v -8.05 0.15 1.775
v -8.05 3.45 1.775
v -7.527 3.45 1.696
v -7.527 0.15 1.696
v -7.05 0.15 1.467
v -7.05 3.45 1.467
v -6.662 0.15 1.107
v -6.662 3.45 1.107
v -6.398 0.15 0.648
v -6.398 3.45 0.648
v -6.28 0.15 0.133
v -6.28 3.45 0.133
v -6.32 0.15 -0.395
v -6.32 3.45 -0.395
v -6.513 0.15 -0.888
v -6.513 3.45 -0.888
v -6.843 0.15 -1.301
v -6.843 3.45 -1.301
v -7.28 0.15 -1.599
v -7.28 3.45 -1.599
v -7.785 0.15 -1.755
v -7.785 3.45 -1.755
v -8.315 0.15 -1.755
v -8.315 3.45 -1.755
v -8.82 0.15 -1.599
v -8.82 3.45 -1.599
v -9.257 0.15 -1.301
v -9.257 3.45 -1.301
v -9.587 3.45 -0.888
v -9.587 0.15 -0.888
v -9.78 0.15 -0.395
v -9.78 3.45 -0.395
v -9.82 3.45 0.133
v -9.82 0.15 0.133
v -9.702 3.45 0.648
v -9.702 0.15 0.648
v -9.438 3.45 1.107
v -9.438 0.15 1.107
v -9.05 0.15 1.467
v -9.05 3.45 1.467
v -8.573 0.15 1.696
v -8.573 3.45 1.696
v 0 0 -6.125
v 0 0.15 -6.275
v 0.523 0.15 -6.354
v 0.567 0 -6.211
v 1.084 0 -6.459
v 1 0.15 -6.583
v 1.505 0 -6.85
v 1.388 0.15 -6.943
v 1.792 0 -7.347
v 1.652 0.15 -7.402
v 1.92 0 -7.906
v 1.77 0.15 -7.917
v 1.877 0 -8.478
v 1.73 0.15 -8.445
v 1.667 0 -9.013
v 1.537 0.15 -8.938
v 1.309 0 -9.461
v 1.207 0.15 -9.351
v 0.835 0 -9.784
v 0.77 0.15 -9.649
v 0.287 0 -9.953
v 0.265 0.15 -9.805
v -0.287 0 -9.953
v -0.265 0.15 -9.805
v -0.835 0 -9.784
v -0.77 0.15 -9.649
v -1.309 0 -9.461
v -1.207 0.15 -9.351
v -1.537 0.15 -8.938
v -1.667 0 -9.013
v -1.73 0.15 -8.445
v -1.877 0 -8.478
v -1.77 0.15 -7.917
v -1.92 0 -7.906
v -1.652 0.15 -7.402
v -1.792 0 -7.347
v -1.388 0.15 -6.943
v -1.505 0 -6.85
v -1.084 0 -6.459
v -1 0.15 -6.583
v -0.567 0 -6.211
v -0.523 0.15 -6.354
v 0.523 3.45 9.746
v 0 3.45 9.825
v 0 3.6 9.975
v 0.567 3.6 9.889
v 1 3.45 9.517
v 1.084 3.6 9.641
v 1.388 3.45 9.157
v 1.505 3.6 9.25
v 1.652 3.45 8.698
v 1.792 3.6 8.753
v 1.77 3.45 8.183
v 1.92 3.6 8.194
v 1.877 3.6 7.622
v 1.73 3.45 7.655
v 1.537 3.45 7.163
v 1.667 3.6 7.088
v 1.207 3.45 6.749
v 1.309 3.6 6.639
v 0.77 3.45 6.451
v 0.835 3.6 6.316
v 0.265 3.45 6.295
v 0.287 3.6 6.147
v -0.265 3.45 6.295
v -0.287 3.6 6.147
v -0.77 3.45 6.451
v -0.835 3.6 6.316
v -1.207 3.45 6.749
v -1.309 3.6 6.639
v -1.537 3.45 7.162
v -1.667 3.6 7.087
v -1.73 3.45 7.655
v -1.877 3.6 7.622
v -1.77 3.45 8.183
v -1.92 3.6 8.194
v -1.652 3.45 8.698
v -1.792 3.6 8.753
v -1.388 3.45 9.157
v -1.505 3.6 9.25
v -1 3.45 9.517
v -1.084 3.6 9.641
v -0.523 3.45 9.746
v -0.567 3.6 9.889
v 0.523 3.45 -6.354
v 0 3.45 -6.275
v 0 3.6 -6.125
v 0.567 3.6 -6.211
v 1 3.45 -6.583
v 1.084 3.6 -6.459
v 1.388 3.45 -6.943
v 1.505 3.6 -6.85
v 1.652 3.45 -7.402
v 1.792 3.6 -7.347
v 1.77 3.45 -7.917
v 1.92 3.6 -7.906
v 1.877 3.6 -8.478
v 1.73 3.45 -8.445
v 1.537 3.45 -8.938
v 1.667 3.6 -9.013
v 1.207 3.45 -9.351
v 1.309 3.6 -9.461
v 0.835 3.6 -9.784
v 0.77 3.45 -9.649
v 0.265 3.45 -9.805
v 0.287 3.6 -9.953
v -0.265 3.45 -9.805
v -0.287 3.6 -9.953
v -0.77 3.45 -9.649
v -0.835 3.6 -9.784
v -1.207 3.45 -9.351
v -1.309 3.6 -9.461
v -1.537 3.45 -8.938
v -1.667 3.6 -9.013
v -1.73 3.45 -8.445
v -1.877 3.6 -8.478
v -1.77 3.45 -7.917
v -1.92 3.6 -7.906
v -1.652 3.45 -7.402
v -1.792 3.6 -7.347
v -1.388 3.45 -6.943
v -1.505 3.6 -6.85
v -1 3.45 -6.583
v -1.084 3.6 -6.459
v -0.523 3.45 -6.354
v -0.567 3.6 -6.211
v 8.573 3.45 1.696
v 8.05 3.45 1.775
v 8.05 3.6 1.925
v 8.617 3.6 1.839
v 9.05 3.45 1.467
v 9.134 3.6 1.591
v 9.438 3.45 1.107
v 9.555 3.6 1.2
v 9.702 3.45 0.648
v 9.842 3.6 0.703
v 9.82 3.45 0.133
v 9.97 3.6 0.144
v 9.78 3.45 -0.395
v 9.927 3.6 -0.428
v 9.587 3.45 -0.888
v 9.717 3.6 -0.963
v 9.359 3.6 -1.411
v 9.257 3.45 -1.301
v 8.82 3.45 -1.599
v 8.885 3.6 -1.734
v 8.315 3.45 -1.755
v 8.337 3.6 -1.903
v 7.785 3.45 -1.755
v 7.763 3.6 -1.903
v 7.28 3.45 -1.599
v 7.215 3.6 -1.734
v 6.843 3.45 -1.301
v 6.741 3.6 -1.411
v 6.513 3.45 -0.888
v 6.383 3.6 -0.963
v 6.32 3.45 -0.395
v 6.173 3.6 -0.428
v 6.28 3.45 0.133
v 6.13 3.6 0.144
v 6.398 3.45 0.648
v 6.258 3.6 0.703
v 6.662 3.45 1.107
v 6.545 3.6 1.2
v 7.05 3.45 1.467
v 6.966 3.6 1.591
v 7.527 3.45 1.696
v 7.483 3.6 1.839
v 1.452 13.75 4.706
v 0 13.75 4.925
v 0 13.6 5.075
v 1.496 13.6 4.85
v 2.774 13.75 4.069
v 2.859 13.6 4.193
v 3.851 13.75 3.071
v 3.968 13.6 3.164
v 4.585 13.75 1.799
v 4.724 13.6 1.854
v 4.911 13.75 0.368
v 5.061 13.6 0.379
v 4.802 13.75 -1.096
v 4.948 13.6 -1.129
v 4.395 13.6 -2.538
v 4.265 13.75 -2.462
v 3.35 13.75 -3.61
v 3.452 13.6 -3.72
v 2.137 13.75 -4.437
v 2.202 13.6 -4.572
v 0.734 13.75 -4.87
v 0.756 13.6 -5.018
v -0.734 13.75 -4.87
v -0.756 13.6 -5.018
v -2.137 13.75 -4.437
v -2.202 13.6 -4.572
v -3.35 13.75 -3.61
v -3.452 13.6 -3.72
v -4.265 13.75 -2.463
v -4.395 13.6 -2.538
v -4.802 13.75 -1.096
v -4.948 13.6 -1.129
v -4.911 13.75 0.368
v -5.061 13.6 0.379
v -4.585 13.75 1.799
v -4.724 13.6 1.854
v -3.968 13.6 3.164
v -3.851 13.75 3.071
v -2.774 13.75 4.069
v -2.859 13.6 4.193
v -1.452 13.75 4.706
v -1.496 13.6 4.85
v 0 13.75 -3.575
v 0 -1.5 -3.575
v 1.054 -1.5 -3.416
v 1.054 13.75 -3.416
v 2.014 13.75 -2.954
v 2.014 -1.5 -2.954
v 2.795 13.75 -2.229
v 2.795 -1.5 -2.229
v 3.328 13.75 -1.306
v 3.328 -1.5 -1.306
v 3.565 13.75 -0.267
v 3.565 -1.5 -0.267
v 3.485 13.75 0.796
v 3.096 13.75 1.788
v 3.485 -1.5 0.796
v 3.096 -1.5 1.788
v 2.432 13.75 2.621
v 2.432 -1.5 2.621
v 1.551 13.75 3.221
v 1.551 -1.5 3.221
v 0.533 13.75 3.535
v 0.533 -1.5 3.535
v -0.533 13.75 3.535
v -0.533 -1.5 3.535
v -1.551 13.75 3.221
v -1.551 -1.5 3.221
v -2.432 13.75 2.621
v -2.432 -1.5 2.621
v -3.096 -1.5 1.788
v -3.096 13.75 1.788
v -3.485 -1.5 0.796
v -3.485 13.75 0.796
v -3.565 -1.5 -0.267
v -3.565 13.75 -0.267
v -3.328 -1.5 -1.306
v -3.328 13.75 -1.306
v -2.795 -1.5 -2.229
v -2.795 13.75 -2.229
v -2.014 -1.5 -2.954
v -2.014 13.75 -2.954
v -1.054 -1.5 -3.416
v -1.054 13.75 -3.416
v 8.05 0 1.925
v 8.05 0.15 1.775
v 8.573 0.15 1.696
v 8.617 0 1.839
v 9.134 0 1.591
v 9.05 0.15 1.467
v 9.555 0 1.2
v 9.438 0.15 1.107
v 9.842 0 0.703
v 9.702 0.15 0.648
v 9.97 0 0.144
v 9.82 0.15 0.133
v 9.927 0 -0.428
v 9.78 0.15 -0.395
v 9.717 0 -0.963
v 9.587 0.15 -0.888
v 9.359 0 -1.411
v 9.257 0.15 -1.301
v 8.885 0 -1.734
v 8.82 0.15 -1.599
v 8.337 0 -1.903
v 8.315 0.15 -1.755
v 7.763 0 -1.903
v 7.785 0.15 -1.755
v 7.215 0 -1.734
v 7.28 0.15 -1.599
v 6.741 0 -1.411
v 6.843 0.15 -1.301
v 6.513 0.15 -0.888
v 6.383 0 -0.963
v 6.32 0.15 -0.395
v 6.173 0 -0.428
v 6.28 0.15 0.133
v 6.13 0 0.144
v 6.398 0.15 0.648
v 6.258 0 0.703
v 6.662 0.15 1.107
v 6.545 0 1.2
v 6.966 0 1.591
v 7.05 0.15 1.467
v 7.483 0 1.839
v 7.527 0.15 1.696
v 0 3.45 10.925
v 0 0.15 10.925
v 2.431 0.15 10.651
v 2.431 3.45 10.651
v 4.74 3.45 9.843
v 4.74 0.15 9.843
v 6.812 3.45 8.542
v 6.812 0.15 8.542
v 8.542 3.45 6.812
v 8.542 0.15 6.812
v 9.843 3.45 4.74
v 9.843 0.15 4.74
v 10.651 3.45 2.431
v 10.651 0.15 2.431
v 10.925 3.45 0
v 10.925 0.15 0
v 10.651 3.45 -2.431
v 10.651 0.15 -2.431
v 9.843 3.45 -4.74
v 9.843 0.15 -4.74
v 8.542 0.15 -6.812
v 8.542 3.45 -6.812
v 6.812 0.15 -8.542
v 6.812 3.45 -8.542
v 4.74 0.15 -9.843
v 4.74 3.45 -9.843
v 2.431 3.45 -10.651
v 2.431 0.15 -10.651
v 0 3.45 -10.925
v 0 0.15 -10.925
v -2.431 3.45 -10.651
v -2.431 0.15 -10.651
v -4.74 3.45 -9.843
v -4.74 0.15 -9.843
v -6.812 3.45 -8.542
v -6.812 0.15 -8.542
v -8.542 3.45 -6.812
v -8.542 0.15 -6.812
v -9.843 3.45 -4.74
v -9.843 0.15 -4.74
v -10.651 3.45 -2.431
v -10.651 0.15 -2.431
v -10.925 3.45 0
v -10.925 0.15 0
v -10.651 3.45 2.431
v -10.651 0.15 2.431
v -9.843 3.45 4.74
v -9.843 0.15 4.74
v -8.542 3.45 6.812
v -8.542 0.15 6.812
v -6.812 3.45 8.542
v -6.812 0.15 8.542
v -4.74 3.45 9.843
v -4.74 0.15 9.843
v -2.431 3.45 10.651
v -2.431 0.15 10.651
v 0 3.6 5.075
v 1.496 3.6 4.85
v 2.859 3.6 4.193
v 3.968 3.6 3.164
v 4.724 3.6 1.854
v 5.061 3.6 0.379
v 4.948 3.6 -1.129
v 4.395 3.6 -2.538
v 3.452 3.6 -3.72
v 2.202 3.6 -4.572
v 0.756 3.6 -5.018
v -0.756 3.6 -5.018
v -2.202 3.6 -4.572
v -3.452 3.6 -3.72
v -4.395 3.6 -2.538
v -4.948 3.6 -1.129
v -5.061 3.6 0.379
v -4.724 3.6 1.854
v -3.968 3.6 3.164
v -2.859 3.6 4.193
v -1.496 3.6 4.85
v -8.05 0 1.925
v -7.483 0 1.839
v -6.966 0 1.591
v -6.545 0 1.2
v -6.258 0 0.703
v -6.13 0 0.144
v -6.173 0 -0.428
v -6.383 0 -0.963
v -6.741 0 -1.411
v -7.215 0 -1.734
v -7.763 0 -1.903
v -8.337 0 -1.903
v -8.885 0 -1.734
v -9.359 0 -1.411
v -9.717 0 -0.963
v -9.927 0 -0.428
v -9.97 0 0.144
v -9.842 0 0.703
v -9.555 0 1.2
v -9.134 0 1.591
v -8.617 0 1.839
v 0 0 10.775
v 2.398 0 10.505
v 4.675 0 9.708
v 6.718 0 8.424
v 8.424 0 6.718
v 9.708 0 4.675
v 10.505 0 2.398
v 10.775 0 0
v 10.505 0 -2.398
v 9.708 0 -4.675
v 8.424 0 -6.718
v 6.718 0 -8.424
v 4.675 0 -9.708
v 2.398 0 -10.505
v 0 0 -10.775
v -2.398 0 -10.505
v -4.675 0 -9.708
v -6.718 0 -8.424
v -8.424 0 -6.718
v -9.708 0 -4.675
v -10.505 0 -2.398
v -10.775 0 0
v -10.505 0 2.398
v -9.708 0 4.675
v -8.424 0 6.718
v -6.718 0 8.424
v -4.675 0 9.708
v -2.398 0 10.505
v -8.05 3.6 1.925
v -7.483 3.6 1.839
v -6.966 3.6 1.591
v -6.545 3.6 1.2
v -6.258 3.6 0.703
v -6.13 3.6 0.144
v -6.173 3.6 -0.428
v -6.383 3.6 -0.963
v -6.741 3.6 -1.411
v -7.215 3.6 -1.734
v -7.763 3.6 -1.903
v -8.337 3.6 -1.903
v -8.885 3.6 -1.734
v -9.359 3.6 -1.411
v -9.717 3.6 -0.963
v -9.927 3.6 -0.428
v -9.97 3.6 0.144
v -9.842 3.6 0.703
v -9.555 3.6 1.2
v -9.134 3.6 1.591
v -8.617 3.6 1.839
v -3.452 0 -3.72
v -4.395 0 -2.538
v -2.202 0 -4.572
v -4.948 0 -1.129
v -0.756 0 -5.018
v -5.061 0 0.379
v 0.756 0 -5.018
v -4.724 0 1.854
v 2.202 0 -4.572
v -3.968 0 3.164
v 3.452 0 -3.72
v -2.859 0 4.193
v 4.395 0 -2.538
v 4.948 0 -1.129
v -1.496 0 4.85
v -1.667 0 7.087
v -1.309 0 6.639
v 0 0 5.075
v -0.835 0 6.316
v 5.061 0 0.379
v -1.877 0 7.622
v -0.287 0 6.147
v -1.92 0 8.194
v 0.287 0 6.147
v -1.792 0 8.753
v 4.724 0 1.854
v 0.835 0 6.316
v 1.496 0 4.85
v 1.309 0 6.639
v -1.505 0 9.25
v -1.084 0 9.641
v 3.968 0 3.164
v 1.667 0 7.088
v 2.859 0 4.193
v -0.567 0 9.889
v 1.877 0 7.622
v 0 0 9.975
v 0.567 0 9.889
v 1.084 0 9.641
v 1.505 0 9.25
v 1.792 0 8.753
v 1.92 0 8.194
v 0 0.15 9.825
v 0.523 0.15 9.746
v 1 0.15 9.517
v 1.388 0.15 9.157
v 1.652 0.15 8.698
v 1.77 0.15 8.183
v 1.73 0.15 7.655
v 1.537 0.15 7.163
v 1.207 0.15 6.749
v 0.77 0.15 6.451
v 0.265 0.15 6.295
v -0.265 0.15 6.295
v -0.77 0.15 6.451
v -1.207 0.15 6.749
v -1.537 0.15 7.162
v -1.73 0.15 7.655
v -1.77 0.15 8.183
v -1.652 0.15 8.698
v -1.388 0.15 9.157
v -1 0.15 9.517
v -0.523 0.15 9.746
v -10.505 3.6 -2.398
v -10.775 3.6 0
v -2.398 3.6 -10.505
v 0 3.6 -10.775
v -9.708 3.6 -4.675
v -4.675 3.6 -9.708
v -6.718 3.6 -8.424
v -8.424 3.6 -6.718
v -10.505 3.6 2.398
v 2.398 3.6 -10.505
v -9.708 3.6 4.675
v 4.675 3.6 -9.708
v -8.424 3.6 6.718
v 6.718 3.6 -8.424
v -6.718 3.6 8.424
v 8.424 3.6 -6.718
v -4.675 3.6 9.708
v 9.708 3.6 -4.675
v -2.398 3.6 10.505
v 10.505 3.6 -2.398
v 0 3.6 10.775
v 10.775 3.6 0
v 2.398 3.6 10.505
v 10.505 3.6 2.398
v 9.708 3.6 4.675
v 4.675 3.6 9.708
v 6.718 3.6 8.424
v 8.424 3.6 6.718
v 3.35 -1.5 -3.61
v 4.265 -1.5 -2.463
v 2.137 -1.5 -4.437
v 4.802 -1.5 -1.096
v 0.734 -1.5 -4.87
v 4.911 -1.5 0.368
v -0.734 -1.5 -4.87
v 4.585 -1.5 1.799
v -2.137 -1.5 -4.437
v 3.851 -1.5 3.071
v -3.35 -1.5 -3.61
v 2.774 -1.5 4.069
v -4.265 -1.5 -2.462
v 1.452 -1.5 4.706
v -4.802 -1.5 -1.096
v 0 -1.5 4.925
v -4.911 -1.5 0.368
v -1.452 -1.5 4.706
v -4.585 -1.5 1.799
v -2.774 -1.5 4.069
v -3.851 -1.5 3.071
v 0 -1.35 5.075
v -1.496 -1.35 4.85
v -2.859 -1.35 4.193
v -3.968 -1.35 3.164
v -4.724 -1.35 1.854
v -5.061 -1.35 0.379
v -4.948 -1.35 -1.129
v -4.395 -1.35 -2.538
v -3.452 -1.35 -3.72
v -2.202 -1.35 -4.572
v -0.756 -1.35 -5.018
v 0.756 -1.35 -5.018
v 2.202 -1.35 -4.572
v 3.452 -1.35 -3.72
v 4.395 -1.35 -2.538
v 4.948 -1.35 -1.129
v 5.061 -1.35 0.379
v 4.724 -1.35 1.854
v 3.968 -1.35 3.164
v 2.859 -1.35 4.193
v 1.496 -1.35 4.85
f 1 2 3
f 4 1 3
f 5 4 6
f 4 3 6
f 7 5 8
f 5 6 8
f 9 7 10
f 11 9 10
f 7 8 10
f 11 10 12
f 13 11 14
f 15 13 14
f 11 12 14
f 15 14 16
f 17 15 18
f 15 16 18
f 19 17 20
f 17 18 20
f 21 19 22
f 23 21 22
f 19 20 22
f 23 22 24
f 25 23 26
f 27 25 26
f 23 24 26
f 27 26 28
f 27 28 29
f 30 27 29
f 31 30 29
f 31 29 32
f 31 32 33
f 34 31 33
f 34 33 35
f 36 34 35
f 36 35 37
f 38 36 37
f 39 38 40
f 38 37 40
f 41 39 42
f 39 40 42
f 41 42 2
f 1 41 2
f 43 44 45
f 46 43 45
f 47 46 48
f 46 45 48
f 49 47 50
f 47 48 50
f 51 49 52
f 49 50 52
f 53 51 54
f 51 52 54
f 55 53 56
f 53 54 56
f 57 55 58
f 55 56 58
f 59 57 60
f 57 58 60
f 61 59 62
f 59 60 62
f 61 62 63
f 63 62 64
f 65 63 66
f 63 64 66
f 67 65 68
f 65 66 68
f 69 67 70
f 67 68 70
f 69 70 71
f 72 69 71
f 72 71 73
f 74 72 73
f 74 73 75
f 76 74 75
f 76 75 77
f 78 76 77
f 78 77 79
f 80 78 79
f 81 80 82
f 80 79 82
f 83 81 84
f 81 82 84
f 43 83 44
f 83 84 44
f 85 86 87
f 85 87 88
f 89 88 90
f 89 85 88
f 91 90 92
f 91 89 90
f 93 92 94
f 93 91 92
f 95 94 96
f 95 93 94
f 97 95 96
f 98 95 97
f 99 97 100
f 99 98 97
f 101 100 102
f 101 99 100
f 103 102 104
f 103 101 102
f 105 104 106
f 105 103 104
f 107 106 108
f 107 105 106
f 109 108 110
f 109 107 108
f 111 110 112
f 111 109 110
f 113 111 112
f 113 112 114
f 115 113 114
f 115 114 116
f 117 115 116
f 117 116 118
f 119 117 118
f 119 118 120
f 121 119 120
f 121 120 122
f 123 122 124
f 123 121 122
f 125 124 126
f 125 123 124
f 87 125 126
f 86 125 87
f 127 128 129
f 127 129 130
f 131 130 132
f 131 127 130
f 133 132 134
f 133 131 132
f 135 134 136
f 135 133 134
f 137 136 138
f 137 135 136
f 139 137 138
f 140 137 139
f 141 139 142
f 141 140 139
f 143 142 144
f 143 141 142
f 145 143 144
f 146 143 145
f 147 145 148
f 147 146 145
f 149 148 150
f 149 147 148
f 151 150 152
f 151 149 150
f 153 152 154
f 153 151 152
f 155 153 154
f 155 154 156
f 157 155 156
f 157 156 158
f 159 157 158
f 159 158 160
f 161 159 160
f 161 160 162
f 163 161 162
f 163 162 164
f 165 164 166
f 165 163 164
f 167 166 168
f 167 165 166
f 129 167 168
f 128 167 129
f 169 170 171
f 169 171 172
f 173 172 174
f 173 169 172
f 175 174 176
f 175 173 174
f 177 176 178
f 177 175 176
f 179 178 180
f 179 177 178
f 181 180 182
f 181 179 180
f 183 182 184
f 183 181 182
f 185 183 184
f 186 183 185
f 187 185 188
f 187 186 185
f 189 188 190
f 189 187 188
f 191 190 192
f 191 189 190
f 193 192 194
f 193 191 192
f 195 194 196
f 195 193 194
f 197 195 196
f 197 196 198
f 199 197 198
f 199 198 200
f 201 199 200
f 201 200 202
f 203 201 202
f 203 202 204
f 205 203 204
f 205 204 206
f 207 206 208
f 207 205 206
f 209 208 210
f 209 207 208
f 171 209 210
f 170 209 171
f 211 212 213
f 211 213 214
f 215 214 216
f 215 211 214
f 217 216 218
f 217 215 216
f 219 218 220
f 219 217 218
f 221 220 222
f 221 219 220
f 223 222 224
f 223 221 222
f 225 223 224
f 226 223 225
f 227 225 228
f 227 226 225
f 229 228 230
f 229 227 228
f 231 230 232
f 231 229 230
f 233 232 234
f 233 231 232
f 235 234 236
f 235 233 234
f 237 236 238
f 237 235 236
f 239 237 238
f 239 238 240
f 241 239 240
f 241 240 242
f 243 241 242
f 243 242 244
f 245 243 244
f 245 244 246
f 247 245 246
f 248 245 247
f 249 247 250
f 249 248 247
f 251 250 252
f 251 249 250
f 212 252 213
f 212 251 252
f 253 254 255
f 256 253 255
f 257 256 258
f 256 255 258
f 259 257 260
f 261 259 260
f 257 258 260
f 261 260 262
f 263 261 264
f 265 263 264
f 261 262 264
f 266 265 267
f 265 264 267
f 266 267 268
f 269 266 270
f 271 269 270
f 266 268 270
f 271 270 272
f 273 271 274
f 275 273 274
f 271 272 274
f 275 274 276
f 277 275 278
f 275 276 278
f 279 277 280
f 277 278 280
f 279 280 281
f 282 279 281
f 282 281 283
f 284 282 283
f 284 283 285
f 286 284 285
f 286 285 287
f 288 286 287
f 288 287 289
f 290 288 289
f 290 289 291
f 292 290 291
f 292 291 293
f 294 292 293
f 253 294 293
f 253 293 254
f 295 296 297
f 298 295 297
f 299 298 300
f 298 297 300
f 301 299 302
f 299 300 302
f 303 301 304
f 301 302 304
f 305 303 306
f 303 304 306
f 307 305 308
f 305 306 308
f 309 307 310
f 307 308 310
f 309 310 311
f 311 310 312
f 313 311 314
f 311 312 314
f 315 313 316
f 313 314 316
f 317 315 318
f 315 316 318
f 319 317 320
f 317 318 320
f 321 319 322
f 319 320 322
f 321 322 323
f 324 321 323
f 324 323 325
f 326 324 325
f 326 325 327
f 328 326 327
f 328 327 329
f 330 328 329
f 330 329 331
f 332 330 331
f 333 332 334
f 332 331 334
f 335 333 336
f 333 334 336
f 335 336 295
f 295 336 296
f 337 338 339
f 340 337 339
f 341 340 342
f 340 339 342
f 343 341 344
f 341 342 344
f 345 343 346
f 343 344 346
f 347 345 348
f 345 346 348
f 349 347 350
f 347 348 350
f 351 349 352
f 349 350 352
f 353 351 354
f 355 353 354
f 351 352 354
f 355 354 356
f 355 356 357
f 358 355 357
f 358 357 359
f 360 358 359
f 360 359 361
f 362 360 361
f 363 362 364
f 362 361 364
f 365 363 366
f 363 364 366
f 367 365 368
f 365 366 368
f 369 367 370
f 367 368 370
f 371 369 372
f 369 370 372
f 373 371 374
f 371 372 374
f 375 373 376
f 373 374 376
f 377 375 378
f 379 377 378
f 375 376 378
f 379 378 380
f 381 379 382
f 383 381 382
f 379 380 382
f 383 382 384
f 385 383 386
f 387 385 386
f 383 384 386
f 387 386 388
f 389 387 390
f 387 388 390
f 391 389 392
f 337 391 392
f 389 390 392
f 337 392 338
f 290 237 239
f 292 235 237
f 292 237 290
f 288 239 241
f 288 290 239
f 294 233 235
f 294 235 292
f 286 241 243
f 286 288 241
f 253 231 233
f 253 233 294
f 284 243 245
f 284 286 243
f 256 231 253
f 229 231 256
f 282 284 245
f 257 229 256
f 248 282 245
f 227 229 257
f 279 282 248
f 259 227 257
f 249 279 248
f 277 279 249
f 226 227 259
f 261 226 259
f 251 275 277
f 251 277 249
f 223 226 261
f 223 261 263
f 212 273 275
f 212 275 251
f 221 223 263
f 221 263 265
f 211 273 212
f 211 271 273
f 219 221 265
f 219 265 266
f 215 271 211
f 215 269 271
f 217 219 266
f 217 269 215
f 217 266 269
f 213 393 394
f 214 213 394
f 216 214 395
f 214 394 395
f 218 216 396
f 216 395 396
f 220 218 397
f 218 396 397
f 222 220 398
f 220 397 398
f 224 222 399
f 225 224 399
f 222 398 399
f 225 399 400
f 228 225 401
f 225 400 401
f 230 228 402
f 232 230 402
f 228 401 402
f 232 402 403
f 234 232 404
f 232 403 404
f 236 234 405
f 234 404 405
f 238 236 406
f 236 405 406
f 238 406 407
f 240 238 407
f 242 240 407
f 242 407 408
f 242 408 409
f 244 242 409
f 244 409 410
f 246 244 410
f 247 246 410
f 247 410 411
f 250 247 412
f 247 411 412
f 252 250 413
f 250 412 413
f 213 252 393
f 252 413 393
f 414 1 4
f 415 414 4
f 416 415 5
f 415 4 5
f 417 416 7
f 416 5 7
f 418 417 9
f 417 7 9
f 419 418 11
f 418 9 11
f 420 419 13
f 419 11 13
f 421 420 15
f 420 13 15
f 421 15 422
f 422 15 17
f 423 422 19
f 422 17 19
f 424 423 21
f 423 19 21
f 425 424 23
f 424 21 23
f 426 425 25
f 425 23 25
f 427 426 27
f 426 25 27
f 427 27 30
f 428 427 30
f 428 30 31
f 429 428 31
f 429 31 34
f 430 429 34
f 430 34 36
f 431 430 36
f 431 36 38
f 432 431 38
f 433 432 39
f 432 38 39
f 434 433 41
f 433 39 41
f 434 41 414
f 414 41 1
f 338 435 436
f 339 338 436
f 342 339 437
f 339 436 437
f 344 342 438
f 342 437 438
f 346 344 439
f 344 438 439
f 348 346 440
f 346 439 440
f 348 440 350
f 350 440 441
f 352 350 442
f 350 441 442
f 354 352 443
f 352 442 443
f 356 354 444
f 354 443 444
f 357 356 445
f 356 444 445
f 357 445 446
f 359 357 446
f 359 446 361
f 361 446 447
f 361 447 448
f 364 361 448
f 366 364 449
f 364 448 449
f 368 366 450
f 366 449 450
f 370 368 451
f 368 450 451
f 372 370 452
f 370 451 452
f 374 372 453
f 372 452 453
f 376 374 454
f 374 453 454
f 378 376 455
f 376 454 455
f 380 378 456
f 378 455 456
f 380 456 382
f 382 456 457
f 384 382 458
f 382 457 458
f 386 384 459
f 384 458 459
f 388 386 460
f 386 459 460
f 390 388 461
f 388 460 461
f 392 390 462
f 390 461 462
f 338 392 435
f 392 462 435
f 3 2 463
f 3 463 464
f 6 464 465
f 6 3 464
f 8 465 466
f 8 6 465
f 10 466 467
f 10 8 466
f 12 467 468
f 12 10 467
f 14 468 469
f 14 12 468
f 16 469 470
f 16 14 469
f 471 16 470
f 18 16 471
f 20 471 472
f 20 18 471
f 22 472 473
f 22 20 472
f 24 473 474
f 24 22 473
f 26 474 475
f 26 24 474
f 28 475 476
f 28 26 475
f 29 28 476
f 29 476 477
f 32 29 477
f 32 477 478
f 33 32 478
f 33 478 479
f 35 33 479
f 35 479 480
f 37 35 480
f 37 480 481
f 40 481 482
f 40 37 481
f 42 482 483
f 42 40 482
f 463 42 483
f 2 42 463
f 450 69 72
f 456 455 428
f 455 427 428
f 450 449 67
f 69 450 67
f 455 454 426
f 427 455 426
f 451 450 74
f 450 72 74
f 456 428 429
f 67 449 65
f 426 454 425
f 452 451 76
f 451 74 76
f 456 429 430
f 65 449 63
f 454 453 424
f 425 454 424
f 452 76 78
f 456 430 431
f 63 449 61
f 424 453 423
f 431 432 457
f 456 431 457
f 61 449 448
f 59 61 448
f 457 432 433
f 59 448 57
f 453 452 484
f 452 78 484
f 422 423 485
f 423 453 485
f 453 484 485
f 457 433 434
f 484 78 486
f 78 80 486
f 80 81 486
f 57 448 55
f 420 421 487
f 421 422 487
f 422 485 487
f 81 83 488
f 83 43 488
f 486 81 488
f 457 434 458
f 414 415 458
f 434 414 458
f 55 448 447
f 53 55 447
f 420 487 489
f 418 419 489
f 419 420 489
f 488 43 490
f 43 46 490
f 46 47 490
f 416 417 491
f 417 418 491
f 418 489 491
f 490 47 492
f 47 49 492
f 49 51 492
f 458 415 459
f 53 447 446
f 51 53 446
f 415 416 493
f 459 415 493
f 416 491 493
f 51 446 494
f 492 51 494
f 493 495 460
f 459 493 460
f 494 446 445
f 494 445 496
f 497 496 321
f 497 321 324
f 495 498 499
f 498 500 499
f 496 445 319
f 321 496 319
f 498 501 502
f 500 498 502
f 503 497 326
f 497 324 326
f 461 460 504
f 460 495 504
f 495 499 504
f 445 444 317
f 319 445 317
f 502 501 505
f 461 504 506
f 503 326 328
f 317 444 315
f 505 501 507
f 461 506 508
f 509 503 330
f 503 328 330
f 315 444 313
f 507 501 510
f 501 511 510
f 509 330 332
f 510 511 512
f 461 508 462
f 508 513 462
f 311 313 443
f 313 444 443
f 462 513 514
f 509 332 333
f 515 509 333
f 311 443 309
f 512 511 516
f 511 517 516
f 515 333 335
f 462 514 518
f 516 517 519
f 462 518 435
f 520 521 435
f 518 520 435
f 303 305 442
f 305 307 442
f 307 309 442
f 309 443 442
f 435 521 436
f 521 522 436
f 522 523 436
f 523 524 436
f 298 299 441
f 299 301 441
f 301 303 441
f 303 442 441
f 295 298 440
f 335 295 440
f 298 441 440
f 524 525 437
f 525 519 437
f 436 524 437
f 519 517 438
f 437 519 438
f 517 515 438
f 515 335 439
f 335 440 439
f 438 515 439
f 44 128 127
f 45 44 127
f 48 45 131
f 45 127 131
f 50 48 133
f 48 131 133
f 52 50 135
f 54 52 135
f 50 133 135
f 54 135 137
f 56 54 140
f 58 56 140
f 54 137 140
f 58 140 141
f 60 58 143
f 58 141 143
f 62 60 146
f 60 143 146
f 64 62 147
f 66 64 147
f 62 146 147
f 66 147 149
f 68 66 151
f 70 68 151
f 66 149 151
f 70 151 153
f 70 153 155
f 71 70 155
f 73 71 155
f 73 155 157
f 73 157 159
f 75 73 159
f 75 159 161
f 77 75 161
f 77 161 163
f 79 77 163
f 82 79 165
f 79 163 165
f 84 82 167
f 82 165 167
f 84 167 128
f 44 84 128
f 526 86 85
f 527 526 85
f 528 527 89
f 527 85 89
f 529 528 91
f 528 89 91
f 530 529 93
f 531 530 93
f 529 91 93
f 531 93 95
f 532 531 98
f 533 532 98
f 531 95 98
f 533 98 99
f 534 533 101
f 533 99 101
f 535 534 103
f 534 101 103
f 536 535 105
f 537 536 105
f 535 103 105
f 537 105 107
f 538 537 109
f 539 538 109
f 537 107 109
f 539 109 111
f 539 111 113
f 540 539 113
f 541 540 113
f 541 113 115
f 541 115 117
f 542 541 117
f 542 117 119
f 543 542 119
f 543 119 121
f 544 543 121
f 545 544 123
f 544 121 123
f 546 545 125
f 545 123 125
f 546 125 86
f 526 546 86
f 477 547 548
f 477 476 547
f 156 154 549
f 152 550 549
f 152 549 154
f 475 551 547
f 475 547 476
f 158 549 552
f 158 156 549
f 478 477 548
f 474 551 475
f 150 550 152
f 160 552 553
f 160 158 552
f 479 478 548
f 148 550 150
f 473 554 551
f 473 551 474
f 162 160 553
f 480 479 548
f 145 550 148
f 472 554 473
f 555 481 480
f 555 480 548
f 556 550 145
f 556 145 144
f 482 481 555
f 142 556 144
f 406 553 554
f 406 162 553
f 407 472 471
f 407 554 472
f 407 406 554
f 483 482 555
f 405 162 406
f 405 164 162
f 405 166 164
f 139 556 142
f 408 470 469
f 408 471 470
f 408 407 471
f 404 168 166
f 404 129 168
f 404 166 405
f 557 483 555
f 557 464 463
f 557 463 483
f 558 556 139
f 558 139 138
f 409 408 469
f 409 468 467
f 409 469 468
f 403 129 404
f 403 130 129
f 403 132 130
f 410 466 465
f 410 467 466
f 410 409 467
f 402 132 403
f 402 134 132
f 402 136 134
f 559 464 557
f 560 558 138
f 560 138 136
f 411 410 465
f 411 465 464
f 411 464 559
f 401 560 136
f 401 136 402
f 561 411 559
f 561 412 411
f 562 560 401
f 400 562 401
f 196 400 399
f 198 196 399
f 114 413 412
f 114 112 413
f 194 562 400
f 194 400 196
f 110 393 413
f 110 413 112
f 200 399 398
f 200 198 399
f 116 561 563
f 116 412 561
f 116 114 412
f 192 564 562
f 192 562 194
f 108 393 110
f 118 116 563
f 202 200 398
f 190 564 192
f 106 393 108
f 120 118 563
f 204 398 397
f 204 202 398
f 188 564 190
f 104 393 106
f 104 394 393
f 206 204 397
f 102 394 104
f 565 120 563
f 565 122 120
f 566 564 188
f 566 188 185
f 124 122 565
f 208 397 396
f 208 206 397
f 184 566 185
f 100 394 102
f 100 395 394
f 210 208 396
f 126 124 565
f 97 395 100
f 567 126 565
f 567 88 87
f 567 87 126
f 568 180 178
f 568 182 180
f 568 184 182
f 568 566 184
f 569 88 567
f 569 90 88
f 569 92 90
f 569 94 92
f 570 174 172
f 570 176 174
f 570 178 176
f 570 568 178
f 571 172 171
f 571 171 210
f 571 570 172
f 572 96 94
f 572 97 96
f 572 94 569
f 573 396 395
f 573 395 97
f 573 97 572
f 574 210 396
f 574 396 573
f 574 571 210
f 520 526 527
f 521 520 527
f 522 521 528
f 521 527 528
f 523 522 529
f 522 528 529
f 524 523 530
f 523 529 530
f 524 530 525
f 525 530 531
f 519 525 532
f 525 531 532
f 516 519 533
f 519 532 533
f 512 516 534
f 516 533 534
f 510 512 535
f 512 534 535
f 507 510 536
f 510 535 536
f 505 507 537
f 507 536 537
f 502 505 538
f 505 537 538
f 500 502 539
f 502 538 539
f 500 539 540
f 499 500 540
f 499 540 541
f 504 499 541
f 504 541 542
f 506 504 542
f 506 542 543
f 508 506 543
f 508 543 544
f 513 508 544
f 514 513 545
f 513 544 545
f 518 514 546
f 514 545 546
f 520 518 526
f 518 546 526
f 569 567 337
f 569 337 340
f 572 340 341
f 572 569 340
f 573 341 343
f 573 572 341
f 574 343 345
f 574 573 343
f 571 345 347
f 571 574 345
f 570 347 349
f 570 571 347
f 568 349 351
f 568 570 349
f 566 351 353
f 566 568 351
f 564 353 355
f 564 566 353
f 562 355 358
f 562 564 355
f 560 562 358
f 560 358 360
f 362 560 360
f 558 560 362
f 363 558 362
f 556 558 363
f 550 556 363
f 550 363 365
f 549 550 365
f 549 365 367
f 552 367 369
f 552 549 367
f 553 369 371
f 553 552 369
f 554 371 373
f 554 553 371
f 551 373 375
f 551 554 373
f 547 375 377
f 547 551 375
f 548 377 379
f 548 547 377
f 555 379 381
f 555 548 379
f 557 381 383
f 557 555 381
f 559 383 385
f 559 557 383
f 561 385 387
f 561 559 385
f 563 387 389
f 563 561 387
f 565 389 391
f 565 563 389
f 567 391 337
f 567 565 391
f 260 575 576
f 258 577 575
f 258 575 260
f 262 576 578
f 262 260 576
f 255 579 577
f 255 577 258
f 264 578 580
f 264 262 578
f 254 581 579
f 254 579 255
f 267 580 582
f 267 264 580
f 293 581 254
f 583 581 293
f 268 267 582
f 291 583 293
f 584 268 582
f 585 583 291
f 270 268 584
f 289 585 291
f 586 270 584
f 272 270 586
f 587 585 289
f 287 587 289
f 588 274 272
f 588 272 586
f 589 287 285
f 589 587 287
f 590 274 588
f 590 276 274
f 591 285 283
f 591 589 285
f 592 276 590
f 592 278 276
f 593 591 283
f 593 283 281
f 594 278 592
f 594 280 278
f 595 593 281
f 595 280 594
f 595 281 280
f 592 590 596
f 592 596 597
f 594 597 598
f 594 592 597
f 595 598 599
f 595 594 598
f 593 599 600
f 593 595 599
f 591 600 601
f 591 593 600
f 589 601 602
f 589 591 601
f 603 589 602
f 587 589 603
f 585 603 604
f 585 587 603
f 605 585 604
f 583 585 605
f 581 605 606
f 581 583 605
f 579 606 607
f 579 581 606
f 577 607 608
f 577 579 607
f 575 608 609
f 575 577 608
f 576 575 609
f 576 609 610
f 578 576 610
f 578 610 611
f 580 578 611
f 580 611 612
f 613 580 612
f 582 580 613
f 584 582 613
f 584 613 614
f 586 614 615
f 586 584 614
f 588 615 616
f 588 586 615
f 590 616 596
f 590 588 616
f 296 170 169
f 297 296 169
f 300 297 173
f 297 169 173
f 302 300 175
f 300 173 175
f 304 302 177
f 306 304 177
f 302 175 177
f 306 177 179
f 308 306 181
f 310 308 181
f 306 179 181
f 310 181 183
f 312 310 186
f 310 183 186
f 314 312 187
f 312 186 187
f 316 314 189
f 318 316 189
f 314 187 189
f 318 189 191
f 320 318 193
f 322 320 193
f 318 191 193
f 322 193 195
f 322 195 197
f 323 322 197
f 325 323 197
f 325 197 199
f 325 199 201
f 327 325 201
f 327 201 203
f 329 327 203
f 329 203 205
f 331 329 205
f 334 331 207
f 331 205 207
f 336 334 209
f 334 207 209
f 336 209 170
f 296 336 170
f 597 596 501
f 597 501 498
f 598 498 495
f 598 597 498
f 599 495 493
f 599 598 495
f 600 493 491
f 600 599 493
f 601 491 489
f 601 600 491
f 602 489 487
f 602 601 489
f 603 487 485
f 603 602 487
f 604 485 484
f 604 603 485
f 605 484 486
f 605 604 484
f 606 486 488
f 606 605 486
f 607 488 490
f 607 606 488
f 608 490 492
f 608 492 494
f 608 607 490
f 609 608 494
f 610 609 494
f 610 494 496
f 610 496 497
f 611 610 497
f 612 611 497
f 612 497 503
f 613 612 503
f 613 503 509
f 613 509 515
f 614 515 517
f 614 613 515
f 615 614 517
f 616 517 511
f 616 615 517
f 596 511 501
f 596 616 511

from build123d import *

# Parameters (mm, degrees)
CROQUIS1_R              = 10.925
SALIENTE_EXTRUIR1_DEPTH = 3.6
CROQUIS2_R              = 1.775
CORTAR_EXTRUIR1_DEPTH   = 3.6
CROQUIS3_R              = 5.075
SALIENTE_EXTRUIR2_DEPTH = 10.15
SALIENTE_EXTRUIR3_START = 1.5
CROQUIS4_R              = 5.075
SALIENTE_EXTRUIR3_DEPTH = 1.5
CROQUIS5_R              = 3.575
CORTAR_EXTRUIR2_DEPTH   = 31.5
CHAFL_N1_SIZE           = 0.15


with BuildPart() as part:
    # Croquis1 → Saliente-Extruir1 (new body)
    with BuildSketch(Plane(origin=(0, 0, 0), x_dir=(1, 0, 0), z_dir=(0, 1, 0))):
        with Locations(Location((0, 0, 0), (0, 0, 270))):
            Circle(CROQUIS1_R)
    extrude(amount=SALIENTE_EXTRUIR1_DEPTH)

    # Croquis2 → Cortar-Extruir1 (cut)
    with BuildSketch(Plane(origin=(0, 3.6, 0), x_dir=(1, 0, 0), z_dir=(0, 1, 0))):
        with Locations(Location((-8.05, 0, 0), (0, 0, 270))):
            Circle(CROQUIS2_R)
        with Locations(Location((8.05, 0, 0), (0, 0, 270))):
            Circle(CROQUIS2_R)
        with Locations(Location((0, -8.05, 0), (0, 0, 270))):
            Circle(CROQUIS2_R)
        with Locations(Location((0, 8.05, 0), (0, 0, 270))):
            Circle(CROQUIS2_R)
    extrude(amount=-CORTAR_EXTRUIR1_DEPTH, mode=Mode.SUBTRACT)

    # Croquis3 → Saliente-Extruir2 (add)
    with BuildSketch(Plane(origin=(0, 3.6, 0), x_dir=(1, 0, 0), z_dir=(0, 1, 0))):
        with Locations(Location((0, 0, 0), (0, 0, 270))):
            Circle(CROQUIS3_R)
    extrude(amount=SALIENTE_EXTRUIR2_DEPTH)

    # Croquis4 → Saliente-Extruir3 (add)
    with BuildSketch(Plane.XZ.offset(SALIENTE_EXTRUIR3_START)):
        with Locations(Location((0, 0, 0), (0, 0, 90))):
            Circle(CROQUIS4_R)
    extrude(amount=-SALIENTE_EXTRUIR3_DEPTH)

    # Croquis5 → Cortar-Extruir2 (cut)
    with BuildSketch(Plane.XZ.offset(1.5)):
        with Locations(Location((0, 0, 0), (0, 0, 270))):
            Circle(CROQUIS5_R)
    extrude(amount=-CORTAR_EXTRUIR2_DEPTH, mode=Mode.SUBTRACT)

    # Chaflán1
    chafl_n1_edges = [part.edges().sort_by_distance(p)[0] for p in [
        (8.05, 0, -1.775),
        (8.05, 3.6, -1.775),
        (0, 0, 6.275),
        (0, 3.6, 6.275),
        (0, 0, -9.825),
        (0, 3.6, -9.825),
        (0, 0, -10.925),
        (0, 13.75, -5.075),
        (0, -1.5, -5.075),
        (0, 3.6, -10.925),
        (-8.05, 0, -1.775),
        (-8.05, 3.6, -1.775),
    ]]
    chamfer(chafl_n1_edges, length=CHAFL_N1_SIZE)


solid = part.part
